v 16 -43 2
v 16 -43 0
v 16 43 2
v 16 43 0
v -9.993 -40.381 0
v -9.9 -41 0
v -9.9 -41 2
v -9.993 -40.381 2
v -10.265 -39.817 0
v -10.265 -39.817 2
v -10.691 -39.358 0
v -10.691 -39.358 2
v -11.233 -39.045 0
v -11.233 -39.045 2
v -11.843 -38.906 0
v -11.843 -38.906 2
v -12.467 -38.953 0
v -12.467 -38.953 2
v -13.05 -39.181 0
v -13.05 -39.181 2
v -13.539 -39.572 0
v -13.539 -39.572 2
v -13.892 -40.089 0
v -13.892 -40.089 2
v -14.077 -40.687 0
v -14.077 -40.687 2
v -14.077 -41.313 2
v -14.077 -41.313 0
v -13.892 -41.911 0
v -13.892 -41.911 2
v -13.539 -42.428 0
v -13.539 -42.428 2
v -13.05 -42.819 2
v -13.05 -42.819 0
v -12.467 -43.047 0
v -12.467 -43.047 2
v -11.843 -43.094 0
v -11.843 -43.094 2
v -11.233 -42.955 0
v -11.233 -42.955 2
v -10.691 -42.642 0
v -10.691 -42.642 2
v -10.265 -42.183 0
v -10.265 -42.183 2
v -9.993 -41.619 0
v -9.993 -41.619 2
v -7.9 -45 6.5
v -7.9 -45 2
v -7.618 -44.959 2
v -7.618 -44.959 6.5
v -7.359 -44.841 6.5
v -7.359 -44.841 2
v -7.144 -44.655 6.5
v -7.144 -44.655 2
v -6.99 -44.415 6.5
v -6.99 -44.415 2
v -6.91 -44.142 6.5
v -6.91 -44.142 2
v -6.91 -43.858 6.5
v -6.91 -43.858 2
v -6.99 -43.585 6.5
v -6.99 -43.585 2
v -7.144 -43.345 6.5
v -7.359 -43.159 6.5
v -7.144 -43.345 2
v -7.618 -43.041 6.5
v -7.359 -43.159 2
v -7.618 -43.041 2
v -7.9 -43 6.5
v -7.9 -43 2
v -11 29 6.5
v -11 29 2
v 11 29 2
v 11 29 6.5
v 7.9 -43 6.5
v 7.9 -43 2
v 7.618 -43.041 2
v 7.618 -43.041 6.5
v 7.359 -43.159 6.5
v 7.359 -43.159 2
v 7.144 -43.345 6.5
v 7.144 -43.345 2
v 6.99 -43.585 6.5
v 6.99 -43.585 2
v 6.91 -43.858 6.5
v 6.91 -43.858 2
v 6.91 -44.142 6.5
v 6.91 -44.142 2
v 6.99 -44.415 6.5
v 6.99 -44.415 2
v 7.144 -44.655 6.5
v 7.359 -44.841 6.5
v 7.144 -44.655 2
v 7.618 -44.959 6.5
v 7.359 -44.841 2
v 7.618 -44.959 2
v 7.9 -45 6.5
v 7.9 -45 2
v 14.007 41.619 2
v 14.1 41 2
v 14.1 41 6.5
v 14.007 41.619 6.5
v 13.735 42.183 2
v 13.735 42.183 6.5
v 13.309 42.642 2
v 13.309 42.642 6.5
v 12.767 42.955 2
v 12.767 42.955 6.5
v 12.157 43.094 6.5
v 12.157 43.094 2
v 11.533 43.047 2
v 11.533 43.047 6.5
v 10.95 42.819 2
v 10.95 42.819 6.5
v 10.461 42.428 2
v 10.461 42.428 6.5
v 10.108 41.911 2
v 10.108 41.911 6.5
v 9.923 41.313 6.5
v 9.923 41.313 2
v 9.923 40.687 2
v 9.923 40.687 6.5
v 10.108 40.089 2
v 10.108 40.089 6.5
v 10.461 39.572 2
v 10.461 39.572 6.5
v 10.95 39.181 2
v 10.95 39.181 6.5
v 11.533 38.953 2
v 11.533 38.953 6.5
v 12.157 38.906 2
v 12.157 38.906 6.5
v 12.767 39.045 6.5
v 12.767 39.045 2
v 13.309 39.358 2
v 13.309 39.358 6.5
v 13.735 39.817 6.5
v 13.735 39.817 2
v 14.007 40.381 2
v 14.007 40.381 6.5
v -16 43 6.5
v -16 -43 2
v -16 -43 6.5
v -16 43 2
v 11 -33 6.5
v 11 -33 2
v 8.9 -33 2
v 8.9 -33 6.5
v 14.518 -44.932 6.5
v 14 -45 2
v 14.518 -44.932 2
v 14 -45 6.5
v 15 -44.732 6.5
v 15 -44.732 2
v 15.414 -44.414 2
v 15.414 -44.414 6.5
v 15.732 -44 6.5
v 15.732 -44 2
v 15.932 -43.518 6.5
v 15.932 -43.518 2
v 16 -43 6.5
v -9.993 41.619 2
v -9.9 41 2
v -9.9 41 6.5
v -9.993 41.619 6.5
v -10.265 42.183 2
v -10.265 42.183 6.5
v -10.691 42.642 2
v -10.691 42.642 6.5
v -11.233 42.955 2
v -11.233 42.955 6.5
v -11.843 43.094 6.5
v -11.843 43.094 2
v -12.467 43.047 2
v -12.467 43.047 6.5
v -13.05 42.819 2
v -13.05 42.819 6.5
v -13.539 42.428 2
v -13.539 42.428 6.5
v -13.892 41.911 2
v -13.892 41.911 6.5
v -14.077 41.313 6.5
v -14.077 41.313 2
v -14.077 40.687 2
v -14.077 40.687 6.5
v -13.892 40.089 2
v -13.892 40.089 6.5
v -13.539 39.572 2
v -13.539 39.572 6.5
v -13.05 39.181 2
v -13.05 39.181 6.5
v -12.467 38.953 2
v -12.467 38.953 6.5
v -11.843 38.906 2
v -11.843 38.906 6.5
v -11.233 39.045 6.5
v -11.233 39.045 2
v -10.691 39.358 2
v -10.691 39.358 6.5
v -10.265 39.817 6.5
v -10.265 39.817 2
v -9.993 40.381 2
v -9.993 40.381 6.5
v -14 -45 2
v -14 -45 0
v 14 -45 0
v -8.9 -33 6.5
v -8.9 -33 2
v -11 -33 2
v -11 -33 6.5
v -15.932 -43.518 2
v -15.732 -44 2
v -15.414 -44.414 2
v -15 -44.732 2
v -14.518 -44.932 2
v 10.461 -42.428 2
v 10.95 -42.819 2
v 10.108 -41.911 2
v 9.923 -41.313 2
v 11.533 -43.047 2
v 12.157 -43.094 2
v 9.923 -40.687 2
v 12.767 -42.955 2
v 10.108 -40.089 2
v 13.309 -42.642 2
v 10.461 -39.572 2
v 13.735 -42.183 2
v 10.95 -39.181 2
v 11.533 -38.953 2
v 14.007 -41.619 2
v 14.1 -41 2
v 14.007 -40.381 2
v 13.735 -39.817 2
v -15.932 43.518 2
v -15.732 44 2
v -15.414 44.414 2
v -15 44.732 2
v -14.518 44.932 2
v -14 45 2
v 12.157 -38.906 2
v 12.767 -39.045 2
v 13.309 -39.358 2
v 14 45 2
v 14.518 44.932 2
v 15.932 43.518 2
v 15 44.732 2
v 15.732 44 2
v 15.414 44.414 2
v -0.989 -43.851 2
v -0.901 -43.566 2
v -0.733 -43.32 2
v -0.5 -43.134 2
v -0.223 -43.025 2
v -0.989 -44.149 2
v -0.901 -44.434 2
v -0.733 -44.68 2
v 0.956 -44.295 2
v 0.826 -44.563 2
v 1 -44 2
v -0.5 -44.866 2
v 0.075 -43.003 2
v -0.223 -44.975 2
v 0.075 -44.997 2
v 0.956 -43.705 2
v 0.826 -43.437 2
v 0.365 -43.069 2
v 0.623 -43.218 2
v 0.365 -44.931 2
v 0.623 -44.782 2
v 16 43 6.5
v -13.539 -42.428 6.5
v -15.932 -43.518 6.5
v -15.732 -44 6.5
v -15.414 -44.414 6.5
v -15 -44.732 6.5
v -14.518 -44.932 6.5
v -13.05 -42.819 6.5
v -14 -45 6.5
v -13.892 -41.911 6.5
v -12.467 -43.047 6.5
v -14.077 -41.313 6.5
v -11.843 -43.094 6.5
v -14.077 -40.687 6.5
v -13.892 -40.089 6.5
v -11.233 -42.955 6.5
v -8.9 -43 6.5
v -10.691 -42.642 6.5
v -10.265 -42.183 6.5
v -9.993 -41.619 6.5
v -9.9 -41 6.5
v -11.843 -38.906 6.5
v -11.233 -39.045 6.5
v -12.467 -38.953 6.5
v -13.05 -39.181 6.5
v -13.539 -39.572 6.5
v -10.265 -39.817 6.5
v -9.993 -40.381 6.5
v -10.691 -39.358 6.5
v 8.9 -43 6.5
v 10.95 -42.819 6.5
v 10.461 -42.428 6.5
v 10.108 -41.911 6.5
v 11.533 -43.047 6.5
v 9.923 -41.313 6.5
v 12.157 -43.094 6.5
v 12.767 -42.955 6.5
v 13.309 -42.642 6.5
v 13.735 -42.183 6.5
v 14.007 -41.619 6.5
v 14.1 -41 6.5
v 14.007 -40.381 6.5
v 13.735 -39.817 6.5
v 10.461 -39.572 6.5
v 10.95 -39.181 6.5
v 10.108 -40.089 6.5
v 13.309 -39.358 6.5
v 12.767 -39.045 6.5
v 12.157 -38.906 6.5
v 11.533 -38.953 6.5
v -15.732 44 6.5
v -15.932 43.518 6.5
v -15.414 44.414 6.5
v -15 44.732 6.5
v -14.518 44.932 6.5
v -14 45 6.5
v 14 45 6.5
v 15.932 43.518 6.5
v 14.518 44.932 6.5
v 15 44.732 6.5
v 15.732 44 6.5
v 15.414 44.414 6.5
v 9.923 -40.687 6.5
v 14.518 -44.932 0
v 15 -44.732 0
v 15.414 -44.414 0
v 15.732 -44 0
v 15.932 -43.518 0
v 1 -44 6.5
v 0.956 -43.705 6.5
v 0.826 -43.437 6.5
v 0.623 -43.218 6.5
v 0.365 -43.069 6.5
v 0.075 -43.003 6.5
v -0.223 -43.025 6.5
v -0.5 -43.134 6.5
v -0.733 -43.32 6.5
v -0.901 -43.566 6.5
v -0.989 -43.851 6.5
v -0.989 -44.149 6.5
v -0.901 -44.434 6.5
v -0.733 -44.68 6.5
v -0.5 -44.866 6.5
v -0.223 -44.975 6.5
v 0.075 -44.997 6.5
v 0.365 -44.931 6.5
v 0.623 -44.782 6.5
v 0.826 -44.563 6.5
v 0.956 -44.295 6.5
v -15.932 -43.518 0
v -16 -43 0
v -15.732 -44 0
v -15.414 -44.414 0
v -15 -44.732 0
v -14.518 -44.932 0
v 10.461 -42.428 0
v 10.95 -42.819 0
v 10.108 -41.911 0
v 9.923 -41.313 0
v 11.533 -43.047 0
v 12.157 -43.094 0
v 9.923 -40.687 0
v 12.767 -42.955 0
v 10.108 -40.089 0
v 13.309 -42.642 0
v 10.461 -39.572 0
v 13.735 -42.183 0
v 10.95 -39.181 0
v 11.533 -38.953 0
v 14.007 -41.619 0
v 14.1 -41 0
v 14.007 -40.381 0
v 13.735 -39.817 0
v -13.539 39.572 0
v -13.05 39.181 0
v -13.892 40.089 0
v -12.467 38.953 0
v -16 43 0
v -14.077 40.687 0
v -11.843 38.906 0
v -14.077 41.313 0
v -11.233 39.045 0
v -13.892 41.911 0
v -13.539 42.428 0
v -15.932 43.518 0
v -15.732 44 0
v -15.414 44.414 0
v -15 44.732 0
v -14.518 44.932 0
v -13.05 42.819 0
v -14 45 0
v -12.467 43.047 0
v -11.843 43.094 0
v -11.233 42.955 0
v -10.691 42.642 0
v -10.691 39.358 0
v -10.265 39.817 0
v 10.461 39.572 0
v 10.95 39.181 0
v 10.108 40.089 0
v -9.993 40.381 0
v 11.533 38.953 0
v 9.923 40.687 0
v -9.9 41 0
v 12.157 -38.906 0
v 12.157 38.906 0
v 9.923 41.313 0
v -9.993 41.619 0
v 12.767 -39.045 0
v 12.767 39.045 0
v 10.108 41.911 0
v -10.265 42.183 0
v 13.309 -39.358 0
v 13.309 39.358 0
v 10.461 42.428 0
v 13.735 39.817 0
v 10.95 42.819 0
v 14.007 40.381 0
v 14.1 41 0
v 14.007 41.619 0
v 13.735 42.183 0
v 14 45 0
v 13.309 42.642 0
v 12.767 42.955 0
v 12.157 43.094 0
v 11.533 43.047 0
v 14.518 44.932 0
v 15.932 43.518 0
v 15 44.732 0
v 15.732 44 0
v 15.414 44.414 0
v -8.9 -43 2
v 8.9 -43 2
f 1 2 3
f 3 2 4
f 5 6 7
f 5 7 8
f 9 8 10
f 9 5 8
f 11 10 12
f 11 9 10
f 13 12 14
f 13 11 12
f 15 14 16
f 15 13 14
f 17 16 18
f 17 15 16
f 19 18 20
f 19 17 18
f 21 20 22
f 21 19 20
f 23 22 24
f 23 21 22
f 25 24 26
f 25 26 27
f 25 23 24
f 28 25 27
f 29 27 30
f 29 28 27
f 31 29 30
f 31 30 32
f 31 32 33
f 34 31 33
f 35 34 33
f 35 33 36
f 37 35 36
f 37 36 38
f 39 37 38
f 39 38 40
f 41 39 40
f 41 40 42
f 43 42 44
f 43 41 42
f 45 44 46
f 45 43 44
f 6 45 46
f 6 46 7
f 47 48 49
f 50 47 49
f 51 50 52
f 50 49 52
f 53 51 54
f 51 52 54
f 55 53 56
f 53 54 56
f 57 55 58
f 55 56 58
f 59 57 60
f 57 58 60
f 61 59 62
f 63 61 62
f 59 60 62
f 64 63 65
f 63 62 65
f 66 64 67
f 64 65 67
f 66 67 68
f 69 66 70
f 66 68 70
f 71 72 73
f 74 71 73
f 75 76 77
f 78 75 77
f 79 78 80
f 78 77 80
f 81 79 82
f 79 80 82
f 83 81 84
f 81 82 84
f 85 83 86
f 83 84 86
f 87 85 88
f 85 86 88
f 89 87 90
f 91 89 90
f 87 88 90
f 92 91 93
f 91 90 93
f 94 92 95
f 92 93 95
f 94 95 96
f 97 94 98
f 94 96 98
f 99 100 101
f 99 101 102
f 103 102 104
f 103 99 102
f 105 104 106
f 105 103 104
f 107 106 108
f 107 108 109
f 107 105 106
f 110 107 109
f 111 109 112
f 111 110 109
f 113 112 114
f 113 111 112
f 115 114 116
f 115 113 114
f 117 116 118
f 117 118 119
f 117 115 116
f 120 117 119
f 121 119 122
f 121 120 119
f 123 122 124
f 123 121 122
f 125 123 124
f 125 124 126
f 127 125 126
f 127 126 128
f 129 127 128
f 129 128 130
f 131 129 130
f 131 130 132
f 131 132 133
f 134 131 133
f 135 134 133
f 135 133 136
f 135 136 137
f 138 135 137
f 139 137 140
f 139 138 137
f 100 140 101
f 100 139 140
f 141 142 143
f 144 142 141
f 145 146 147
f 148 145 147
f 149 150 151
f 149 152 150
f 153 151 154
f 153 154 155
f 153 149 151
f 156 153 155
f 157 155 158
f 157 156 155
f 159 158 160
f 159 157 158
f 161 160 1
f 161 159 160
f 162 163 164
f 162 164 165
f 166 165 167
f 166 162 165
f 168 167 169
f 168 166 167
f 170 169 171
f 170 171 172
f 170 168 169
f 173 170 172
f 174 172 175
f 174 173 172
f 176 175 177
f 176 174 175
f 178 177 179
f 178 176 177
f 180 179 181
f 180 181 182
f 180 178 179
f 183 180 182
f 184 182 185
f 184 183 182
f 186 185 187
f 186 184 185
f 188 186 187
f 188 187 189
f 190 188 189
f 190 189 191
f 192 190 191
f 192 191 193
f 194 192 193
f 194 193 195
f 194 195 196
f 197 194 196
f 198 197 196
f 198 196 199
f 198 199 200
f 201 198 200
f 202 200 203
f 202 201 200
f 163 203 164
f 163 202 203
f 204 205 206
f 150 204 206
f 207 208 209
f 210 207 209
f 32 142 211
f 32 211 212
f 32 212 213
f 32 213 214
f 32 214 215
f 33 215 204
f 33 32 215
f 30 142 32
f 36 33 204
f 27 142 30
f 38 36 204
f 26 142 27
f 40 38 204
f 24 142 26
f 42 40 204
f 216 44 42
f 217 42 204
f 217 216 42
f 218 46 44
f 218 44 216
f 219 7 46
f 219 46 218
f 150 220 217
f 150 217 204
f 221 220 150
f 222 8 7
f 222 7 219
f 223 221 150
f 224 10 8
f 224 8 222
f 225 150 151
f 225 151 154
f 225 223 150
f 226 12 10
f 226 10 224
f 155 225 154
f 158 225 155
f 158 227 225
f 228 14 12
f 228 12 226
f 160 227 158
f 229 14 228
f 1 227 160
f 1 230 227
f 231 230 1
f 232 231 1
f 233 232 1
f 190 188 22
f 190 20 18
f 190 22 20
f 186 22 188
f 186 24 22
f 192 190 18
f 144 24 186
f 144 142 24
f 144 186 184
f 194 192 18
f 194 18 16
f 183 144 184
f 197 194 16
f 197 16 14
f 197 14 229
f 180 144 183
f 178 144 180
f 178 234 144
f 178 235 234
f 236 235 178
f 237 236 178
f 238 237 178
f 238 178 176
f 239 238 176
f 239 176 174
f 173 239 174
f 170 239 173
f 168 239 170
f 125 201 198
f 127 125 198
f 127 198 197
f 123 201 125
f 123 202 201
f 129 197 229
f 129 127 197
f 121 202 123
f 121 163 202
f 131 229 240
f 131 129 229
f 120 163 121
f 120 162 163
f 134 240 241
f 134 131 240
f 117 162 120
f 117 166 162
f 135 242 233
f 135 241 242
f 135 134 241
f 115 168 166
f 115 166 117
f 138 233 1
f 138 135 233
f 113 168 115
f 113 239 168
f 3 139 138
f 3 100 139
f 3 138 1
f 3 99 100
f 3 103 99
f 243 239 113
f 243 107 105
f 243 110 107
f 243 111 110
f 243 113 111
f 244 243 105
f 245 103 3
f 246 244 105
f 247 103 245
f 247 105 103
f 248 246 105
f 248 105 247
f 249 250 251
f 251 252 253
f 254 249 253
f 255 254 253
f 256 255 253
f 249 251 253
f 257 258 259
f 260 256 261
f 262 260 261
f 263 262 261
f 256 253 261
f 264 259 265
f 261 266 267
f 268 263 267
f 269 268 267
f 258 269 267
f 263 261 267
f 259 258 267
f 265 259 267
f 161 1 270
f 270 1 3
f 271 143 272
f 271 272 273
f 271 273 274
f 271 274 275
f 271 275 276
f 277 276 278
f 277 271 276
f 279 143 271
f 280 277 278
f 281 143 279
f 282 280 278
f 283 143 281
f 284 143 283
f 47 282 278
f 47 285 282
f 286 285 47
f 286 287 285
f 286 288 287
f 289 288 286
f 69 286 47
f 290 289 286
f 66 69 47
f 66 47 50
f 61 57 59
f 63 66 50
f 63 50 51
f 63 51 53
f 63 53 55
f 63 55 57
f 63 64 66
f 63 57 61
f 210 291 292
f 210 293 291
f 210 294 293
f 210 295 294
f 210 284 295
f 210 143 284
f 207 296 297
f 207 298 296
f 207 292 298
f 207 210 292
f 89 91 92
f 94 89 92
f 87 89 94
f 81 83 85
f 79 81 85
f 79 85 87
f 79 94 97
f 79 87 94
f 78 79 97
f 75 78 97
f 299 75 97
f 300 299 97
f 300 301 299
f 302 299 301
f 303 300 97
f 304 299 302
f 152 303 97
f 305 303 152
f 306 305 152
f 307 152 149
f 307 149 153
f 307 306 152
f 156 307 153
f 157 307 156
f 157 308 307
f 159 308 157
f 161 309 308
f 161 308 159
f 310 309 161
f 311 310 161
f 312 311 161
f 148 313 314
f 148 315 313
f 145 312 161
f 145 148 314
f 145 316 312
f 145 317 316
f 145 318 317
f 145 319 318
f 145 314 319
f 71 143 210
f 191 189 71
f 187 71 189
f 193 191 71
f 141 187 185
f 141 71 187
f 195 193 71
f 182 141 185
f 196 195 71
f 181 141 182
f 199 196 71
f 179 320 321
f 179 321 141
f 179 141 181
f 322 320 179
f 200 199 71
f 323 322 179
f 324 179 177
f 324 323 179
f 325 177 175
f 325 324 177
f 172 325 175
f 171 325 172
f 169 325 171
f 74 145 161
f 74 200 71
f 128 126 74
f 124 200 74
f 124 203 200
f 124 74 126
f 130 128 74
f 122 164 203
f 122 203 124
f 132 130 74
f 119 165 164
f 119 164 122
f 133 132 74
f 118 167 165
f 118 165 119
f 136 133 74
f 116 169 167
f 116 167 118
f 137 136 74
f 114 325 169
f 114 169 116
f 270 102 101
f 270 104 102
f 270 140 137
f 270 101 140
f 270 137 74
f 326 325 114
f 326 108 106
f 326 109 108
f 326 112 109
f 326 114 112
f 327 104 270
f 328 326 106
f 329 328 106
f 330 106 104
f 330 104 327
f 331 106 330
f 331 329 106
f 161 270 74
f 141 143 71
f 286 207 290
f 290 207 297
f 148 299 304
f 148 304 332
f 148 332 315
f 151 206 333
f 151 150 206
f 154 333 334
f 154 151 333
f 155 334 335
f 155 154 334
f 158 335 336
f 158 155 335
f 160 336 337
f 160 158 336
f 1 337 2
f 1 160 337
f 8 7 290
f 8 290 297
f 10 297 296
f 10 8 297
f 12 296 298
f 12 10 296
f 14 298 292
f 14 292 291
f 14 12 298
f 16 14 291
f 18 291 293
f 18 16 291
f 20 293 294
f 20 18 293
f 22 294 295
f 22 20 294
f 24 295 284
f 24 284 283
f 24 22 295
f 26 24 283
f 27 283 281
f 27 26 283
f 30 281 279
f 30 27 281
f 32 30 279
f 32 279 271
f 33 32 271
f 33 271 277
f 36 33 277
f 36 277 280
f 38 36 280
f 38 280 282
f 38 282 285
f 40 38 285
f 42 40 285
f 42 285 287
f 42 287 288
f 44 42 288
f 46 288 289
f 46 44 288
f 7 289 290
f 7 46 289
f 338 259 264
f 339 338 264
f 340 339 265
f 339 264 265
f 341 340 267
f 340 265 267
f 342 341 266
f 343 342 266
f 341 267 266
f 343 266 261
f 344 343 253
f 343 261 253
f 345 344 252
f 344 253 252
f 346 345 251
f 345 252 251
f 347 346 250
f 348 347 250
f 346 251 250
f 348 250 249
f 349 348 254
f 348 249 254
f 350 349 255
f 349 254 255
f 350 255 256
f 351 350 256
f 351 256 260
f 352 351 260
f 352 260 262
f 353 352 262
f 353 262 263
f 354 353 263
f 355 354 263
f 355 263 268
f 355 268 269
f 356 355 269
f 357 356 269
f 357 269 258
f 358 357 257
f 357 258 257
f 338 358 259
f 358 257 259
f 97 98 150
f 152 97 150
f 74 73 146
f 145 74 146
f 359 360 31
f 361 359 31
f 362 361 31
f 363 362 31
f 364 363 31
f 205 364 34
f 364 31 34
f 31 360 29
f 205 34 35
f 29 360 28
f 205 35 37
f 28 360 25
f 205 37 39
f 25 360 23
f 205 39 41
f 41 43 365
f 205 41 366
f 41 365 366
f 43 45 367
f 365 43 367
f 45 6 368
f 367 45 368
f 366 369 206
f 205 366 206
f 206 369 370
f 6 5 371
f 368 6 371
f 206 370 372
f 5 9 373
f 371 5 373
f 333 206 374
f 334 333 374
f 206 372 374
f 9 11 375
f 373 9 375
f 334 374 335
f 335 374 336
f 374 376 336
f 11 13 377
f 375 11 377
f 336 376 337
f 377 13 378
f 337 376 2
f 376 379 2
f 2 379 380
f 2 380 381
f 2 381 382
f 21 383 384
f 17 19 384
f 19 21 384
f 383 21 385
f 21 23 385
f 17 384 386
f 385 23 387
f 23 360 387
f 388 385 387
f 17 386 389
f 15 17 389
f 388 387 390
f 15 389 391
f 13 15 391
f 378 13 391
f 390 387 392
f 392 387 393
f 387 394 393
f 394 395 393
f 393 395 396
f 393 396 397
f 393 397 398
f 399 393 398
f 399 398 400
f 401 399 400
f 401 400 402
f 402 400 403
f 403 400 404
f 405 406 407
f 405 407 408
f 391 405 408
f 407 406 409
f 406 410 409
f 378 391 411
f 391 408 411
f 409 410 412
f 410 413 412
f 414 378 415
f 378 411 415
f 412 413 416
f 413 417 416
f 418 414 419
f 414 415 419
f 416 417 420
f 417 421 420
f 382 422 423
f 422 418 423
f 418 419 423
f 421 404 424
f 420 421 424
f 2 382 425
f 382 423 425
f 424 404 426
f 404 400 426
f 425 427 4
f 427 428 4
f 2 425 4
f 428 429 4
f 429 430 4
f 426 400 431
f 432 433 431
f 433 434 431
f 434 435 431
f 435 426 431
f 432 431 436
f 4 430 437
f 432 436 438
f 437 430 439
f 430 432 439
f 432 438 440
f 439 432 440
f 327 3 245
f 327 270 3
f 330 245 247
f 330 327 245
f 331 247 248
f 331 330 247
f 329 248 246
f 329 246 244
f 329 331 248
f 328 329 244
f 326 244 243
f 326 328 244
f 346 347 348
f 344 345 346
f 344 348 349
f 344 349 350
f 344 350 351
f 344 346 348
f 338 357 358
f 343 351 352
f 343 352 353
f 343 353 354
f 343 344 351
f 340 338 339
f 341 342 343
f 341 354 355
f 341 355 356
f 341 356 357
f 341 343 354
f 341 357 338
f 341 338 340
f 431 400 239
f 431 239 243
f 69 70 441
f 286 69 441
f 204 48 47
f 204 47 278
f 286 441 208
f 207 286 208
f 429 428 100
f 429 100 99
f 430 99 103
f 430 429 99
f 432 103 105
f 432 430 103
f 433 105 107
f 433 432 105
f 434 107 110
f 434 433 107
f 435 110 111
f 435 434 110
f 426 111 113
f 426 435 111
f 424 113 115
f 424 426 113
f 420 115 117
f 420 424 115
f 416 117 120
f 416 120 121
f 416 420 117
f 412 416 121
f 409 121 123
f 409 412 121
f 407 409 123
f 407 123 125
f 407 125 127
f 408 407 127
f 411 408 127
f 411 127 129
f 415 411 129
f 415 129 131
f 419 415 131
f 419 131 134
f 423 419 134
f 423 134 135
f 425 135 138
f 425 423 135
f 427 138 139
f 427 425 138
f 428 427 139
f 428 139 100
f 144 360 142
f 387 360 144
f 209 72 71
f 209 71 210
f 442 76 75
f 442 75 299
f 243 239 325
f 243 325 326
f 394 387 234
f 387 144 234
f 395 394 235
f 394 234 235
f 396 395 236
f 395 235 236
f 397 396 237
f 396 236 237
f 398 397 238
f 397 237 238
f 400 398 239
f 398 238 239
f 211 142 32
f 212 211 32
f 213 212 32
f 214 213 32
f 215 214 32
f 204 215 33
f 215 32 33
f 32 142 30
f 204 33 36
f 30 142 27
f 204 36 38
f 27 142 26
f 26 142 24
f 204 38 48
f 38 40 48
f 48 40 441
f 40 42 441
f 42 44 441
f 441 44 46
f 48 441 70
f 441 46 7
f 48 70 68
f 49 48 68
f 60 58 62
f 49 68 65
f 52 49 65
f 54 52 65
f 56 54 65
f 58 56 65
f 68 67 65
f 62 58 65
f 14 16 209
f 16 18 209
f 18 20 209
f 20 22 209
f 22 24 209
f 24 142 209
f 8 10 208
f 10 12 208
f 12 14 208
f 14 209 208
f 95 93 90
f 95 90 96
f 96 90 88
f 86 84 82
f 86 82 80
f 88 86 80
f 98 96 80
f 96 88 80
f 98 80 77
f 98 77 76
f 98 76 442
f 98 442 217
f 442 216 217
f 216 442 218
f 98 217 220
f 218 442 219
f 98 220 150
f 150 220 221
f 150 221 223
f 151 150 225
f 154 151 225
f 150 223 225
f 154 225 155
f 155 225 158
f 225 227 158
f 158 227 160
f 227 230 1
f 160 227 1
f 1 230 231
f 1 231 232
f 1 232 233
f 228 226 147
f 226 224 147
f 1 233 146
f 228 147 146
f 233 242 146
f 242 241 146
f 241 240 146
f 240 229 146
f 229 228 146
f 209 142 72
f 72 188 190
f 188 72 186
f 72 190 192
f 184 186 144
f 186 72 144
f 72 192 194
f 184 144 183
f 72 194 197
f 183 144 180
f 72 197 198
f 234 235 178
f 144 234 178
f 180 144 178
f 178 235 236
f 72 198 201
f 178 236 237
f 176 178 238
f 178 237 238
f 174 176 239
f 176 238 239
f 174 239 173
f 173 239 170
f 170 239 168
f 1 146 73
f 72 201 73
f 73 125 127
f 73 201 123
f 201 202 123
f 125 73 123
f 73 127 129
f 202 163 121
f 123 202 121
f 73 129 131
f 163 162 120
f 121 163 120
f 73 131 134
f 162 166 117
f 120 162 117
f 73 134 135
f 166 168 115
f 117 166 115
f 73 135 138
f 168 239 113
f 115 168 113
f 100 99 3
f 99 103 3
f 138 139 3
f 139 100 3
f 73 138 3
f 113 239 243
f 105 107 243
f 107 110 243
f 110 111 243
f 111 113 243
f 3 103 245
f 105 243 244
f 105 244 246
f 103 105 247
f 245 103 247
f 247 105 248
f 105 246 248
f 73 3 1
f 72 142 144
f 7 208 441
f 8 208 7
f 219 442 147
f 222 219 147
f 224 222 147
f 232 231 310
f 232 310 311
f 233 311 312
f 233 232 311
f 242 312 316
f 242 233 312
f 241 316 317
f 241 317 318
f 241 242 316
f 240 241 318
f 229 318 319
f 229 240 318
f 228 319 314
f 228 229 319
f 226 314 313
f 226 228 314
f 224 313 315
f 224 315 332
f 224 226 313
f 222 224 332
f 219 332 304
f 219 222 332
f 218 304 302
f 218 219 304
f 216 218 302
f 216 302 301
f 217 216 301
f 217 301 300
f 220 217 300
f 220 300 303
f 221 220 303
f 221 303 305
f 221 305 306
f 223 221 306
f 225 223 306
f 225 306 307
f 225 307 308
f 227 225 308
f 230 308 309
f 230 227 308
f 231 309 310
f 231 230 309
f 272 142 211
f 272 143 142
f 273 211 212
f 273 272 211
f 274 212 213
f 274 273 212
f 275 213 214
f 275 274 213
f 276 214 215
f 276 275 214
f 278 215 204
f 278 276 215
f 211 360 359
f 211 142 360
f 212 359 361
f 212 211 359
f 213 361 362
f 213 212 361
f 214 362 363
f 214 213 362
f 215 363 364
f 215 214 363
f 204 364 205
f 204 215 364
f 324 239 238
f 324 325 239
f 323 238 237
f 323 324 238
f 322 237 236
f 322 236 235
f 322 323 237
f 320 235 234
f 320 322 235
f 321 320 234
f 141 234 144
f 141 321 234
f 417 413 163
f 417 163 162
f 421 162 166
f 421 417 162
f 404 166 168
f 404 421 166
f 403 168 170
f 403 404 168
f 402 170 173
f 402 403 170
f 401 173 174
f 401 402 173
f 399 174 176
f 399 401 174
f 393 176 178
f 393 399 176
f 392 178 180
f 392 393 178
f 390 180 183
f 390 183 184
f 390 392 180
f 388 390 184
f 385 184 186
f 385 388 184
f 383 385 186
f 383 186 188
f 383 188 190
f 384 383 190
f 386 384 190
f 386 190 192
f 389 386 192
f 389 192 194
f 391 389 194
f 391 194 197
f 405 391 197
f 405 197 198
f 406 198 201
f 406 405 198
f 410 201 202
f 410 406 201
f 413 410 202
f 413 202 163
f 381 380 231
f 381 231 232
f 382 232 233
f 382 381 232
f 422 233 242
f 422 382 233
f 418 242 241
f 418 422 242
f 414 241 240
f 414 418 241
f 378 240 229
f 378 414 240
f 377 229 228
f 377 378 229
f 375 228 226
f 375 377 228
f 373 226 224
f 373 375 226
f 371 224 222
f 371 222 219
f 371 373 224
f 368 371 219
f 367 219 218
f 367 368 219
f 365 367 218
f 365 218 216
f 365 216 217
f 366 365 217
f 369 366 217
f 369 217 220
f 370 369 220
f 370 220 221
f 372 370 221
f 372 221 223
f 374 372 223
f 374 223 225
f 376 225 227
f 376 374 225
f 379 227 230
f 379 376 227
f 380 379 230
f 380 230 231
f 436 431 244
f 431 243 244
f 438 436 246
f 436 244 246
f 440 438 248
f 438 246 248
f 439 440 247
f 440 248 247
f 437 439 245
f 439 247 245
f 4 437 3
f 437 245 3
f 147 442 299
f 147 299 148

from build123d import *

# Parameters (mm, degrees)
SKETCH001_R      = 1
SKETCH001_R_2    = 2.1
EXTRUDE001_DEPTH = 4.5
FILLET001_R      = 2
SKETCH002_W      = 16
SKETCH002_H      = 39
EXTRUDE002_DEPTH = 2
SKETCH_W         = 32
SKETCH_H         = 90
SKETCH_R         = 2.1
SKETCH_W_2       = 16
SKETCH_H_2       = 39
EXTRUDE_DEPTH    = 2
FILLET_R         = 2


with BuildPart() as fillet001:
    # Sketch001 (on Face14 of Extrude) → Extrude001 (new body)
    with BuildSketch(Plane.XY.offset(2)):
        with Locations((0, -44)):
            Circle(SKETCH001_R)
        with BuildLine():
            ThreePointArc((7.9, -43), (6.9, -44), (7.9, -45))
            Line((7.9, -45), (16, -45))
            Line((16, -45), (16, 45))
            Line((-16, 45), (16, 45))
            Line((-16, -45), (-16, 45))
            Line((-7.9, -45), (-16, -45))
            ThreePointArc((-7.9, -45), (-6.9, -44), (-7.9, -43))
            Line((-7.9, -43), (-8.9, -43))
            Line((-8.9, -43), (-8.9, -33))
            Line((-8.9, -33), (-11, -33))
            Line((-11, 29), (-11, -33))
            Line((-11, 29), (11, 29))
            Line((11, 29), (11, -33))
            Line((11, -33), (8.9, -33))
            Line((8.9, -43), (8.9, -33))
            Line((7.9, -43), (8.9, -43))
        make_face()
        with Locations((-12, -41)):
            Circle(SKETCH001_R_2, mode=Mode.SUBTRACT)
        with Locations((12, 41)):
            Circle(SKETCH001_R_2, mode=Mode.SUBTRACT)
        with Locations((12, -41)):
            Circle(SKETCH001_R_2, mode=Mode.SUBTRACT)
        with Locations((-12, 41)):
            Circle(SKETCH001_R_2, mode=Mode.SUBTRACT)
    extrude(amount=EXTRUDE001_DEPTH)

    # Fillet001
    fillet001_edges = [fillet001.edges().sort_by_distance(p)[0] for p in [
        (16, -45, 4.25),
        (16, 45, 4.25),
        (-16, 45, 4.25),
        (-16, -45, 4.25),
    ]]
    fillet(fillet001_edges, radius=FILLET001_R)


with BuildPart() as extrude002:
    # Sketch002 → Extrude002 (new body)
    with BuildSketch(Plane.XY):
        with Locations((0, 9.5)):
            Rectangle(SKETCH002_W, SKETCH002_H)
    extrude(amount=EXTRUDE002_DEPTH)


with BuildPart() as fusion:
    # Sketch → Extrude (new body)
    with BuildSketch(Plane.XY):
        Rectangle(SKETCH_W, SKETCH_H)
        with Locations((-12, 41)):
            Circle(SKETCH_R, mode=Mode.SUBTRACT)
        with Locations((12, 41)):
            Circle(SKETCH_R, mode=Mode.SUBTRACT)
        with Locations((-12, -41)):
            Circle(SKETCH_R, mode=Mode.SUBTRACT)
        with Locations((12, -41)):
            Circle(SKETCH_R, mode=Mode.SUBTRACT)
        with Locations((0, 9.5)):
            Rectangle(SKETCH_W_2, SKETCH_H_2, mode=Mode.SUBTRACT)
    extrude(amount=EXTRUDE_DEPTH)

    # Fillet
    fillet_edges = [fusion.edges().sort_by_distance(p)[0] for p in [
        (-16, 45, 1),
        (16, 45, 1),
        (16, -45, 1),
        (-16, -45, 1),
    ]]
    fillet(fillet_edges, radius=FILLET_R)

    # Fusion: union Extrude002
    add(extrude002.part)


solid = Compound([fillet001.part, fusion.part])
